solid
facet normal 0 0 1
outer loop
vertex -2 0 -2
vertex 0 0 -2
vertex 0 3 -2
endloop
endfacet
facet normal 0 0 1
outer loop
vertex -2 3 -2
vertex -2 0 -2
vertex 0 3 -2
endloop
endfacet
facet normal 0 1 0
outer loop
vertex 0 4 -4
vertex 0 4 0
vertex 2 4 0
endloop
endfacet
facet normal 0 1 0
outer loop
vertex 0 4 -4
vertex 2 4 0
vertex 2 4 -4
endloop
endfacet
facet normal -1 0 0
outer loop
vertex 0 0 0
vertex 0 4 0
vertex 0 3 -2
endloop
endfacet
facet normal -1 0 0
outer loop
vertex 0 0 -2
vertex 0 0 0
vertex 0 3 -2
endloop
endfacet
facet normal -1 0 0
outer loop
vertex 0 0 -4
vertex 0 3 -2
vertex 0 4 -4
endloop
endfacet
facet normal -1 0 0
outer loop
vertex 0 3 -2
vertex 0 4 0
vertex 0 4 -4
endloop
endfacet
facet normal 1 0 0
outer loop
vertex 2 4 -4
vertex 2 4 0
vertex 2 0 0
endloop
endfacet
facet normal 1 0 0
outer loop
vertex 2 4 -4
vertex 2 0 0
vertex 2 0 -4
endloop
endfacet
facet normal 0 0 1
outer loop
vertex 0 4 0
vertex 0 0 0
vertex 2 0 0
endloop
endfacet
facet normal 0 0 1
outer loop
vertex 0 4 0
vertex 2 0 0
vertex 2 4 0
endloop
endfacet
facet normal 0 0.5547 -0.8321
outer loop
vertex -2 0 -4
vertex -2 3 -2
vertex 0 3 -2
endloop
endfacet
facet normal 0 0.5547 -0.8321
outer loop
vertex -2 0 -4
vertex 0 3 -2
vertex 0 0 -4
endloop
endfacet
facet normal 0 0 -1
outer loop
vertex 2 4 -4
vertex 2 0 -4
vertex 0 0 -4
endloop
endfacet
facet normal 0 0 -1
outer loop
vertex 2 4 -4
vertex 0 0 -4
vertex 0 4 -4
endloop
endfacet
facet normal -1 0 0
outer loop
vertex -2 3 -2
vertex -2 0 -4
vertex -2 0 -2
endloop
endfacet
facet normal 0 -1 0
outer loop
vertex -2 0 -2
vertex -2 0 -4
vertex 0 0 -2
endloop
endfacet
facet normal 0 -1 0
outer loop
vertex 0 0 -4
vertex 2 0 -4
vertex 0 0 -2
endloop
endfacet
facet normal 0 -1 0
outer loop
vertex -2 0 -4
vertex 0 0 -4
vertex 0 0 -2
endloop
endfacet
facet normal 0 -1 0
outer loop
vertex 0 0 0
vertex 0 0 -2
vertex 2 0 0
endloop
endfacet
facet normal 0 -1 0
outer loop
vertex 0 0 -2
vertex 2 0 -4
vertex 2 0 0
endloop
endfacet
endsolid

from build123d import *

# Parameters (mm, degrees)
SKETCH1_W           = 4
SKETCH1_H           = 4
BOSS_EXTRUDE1_DEPTH = 2
SKETCH2_W           = 2
SKETCH2_H           = 3
BOSS_EXTRUDE2_DEPTH = 2
CUT_EXTRUDE1_DEPTH  = 2


with BuildPart() as part:
    # Sketch1 → Boss-Extrude1 (new body)
    with BuildSketch(Plane(origin=(0, 0, 0), x_dir=(0, 0, -1), z_dir=(1, 0, 0))):
        with Locations((2, 2)):
            Rectangle(SKETCH1_W, SKETCH1_H)
    extrude(amount=BOSS_EXTRUDE1_DEPTH)

    # Sketch2 → Boss-Extrude2 (add)
    with BuildSketch(Plane.ZY):
        with Locations((-3, 1.5)):
            Rectangle(SKETCH2_W, SKETCH2_H)
    extrude(amount=BOSS_EXTRUDE2_DEPTH)

    # Sketch3 → Cut-Extrude1 (cut)
    with BuildSketch(Plane.ZY.offset(2)):
        Polygon((-2, 3), (-4, 0), (-4, 3), align=None)
    extrude(amount=-CUT_EXTRUDE1_DEPTH, mode=Mode.SUBTRACT)


solid = part.part
